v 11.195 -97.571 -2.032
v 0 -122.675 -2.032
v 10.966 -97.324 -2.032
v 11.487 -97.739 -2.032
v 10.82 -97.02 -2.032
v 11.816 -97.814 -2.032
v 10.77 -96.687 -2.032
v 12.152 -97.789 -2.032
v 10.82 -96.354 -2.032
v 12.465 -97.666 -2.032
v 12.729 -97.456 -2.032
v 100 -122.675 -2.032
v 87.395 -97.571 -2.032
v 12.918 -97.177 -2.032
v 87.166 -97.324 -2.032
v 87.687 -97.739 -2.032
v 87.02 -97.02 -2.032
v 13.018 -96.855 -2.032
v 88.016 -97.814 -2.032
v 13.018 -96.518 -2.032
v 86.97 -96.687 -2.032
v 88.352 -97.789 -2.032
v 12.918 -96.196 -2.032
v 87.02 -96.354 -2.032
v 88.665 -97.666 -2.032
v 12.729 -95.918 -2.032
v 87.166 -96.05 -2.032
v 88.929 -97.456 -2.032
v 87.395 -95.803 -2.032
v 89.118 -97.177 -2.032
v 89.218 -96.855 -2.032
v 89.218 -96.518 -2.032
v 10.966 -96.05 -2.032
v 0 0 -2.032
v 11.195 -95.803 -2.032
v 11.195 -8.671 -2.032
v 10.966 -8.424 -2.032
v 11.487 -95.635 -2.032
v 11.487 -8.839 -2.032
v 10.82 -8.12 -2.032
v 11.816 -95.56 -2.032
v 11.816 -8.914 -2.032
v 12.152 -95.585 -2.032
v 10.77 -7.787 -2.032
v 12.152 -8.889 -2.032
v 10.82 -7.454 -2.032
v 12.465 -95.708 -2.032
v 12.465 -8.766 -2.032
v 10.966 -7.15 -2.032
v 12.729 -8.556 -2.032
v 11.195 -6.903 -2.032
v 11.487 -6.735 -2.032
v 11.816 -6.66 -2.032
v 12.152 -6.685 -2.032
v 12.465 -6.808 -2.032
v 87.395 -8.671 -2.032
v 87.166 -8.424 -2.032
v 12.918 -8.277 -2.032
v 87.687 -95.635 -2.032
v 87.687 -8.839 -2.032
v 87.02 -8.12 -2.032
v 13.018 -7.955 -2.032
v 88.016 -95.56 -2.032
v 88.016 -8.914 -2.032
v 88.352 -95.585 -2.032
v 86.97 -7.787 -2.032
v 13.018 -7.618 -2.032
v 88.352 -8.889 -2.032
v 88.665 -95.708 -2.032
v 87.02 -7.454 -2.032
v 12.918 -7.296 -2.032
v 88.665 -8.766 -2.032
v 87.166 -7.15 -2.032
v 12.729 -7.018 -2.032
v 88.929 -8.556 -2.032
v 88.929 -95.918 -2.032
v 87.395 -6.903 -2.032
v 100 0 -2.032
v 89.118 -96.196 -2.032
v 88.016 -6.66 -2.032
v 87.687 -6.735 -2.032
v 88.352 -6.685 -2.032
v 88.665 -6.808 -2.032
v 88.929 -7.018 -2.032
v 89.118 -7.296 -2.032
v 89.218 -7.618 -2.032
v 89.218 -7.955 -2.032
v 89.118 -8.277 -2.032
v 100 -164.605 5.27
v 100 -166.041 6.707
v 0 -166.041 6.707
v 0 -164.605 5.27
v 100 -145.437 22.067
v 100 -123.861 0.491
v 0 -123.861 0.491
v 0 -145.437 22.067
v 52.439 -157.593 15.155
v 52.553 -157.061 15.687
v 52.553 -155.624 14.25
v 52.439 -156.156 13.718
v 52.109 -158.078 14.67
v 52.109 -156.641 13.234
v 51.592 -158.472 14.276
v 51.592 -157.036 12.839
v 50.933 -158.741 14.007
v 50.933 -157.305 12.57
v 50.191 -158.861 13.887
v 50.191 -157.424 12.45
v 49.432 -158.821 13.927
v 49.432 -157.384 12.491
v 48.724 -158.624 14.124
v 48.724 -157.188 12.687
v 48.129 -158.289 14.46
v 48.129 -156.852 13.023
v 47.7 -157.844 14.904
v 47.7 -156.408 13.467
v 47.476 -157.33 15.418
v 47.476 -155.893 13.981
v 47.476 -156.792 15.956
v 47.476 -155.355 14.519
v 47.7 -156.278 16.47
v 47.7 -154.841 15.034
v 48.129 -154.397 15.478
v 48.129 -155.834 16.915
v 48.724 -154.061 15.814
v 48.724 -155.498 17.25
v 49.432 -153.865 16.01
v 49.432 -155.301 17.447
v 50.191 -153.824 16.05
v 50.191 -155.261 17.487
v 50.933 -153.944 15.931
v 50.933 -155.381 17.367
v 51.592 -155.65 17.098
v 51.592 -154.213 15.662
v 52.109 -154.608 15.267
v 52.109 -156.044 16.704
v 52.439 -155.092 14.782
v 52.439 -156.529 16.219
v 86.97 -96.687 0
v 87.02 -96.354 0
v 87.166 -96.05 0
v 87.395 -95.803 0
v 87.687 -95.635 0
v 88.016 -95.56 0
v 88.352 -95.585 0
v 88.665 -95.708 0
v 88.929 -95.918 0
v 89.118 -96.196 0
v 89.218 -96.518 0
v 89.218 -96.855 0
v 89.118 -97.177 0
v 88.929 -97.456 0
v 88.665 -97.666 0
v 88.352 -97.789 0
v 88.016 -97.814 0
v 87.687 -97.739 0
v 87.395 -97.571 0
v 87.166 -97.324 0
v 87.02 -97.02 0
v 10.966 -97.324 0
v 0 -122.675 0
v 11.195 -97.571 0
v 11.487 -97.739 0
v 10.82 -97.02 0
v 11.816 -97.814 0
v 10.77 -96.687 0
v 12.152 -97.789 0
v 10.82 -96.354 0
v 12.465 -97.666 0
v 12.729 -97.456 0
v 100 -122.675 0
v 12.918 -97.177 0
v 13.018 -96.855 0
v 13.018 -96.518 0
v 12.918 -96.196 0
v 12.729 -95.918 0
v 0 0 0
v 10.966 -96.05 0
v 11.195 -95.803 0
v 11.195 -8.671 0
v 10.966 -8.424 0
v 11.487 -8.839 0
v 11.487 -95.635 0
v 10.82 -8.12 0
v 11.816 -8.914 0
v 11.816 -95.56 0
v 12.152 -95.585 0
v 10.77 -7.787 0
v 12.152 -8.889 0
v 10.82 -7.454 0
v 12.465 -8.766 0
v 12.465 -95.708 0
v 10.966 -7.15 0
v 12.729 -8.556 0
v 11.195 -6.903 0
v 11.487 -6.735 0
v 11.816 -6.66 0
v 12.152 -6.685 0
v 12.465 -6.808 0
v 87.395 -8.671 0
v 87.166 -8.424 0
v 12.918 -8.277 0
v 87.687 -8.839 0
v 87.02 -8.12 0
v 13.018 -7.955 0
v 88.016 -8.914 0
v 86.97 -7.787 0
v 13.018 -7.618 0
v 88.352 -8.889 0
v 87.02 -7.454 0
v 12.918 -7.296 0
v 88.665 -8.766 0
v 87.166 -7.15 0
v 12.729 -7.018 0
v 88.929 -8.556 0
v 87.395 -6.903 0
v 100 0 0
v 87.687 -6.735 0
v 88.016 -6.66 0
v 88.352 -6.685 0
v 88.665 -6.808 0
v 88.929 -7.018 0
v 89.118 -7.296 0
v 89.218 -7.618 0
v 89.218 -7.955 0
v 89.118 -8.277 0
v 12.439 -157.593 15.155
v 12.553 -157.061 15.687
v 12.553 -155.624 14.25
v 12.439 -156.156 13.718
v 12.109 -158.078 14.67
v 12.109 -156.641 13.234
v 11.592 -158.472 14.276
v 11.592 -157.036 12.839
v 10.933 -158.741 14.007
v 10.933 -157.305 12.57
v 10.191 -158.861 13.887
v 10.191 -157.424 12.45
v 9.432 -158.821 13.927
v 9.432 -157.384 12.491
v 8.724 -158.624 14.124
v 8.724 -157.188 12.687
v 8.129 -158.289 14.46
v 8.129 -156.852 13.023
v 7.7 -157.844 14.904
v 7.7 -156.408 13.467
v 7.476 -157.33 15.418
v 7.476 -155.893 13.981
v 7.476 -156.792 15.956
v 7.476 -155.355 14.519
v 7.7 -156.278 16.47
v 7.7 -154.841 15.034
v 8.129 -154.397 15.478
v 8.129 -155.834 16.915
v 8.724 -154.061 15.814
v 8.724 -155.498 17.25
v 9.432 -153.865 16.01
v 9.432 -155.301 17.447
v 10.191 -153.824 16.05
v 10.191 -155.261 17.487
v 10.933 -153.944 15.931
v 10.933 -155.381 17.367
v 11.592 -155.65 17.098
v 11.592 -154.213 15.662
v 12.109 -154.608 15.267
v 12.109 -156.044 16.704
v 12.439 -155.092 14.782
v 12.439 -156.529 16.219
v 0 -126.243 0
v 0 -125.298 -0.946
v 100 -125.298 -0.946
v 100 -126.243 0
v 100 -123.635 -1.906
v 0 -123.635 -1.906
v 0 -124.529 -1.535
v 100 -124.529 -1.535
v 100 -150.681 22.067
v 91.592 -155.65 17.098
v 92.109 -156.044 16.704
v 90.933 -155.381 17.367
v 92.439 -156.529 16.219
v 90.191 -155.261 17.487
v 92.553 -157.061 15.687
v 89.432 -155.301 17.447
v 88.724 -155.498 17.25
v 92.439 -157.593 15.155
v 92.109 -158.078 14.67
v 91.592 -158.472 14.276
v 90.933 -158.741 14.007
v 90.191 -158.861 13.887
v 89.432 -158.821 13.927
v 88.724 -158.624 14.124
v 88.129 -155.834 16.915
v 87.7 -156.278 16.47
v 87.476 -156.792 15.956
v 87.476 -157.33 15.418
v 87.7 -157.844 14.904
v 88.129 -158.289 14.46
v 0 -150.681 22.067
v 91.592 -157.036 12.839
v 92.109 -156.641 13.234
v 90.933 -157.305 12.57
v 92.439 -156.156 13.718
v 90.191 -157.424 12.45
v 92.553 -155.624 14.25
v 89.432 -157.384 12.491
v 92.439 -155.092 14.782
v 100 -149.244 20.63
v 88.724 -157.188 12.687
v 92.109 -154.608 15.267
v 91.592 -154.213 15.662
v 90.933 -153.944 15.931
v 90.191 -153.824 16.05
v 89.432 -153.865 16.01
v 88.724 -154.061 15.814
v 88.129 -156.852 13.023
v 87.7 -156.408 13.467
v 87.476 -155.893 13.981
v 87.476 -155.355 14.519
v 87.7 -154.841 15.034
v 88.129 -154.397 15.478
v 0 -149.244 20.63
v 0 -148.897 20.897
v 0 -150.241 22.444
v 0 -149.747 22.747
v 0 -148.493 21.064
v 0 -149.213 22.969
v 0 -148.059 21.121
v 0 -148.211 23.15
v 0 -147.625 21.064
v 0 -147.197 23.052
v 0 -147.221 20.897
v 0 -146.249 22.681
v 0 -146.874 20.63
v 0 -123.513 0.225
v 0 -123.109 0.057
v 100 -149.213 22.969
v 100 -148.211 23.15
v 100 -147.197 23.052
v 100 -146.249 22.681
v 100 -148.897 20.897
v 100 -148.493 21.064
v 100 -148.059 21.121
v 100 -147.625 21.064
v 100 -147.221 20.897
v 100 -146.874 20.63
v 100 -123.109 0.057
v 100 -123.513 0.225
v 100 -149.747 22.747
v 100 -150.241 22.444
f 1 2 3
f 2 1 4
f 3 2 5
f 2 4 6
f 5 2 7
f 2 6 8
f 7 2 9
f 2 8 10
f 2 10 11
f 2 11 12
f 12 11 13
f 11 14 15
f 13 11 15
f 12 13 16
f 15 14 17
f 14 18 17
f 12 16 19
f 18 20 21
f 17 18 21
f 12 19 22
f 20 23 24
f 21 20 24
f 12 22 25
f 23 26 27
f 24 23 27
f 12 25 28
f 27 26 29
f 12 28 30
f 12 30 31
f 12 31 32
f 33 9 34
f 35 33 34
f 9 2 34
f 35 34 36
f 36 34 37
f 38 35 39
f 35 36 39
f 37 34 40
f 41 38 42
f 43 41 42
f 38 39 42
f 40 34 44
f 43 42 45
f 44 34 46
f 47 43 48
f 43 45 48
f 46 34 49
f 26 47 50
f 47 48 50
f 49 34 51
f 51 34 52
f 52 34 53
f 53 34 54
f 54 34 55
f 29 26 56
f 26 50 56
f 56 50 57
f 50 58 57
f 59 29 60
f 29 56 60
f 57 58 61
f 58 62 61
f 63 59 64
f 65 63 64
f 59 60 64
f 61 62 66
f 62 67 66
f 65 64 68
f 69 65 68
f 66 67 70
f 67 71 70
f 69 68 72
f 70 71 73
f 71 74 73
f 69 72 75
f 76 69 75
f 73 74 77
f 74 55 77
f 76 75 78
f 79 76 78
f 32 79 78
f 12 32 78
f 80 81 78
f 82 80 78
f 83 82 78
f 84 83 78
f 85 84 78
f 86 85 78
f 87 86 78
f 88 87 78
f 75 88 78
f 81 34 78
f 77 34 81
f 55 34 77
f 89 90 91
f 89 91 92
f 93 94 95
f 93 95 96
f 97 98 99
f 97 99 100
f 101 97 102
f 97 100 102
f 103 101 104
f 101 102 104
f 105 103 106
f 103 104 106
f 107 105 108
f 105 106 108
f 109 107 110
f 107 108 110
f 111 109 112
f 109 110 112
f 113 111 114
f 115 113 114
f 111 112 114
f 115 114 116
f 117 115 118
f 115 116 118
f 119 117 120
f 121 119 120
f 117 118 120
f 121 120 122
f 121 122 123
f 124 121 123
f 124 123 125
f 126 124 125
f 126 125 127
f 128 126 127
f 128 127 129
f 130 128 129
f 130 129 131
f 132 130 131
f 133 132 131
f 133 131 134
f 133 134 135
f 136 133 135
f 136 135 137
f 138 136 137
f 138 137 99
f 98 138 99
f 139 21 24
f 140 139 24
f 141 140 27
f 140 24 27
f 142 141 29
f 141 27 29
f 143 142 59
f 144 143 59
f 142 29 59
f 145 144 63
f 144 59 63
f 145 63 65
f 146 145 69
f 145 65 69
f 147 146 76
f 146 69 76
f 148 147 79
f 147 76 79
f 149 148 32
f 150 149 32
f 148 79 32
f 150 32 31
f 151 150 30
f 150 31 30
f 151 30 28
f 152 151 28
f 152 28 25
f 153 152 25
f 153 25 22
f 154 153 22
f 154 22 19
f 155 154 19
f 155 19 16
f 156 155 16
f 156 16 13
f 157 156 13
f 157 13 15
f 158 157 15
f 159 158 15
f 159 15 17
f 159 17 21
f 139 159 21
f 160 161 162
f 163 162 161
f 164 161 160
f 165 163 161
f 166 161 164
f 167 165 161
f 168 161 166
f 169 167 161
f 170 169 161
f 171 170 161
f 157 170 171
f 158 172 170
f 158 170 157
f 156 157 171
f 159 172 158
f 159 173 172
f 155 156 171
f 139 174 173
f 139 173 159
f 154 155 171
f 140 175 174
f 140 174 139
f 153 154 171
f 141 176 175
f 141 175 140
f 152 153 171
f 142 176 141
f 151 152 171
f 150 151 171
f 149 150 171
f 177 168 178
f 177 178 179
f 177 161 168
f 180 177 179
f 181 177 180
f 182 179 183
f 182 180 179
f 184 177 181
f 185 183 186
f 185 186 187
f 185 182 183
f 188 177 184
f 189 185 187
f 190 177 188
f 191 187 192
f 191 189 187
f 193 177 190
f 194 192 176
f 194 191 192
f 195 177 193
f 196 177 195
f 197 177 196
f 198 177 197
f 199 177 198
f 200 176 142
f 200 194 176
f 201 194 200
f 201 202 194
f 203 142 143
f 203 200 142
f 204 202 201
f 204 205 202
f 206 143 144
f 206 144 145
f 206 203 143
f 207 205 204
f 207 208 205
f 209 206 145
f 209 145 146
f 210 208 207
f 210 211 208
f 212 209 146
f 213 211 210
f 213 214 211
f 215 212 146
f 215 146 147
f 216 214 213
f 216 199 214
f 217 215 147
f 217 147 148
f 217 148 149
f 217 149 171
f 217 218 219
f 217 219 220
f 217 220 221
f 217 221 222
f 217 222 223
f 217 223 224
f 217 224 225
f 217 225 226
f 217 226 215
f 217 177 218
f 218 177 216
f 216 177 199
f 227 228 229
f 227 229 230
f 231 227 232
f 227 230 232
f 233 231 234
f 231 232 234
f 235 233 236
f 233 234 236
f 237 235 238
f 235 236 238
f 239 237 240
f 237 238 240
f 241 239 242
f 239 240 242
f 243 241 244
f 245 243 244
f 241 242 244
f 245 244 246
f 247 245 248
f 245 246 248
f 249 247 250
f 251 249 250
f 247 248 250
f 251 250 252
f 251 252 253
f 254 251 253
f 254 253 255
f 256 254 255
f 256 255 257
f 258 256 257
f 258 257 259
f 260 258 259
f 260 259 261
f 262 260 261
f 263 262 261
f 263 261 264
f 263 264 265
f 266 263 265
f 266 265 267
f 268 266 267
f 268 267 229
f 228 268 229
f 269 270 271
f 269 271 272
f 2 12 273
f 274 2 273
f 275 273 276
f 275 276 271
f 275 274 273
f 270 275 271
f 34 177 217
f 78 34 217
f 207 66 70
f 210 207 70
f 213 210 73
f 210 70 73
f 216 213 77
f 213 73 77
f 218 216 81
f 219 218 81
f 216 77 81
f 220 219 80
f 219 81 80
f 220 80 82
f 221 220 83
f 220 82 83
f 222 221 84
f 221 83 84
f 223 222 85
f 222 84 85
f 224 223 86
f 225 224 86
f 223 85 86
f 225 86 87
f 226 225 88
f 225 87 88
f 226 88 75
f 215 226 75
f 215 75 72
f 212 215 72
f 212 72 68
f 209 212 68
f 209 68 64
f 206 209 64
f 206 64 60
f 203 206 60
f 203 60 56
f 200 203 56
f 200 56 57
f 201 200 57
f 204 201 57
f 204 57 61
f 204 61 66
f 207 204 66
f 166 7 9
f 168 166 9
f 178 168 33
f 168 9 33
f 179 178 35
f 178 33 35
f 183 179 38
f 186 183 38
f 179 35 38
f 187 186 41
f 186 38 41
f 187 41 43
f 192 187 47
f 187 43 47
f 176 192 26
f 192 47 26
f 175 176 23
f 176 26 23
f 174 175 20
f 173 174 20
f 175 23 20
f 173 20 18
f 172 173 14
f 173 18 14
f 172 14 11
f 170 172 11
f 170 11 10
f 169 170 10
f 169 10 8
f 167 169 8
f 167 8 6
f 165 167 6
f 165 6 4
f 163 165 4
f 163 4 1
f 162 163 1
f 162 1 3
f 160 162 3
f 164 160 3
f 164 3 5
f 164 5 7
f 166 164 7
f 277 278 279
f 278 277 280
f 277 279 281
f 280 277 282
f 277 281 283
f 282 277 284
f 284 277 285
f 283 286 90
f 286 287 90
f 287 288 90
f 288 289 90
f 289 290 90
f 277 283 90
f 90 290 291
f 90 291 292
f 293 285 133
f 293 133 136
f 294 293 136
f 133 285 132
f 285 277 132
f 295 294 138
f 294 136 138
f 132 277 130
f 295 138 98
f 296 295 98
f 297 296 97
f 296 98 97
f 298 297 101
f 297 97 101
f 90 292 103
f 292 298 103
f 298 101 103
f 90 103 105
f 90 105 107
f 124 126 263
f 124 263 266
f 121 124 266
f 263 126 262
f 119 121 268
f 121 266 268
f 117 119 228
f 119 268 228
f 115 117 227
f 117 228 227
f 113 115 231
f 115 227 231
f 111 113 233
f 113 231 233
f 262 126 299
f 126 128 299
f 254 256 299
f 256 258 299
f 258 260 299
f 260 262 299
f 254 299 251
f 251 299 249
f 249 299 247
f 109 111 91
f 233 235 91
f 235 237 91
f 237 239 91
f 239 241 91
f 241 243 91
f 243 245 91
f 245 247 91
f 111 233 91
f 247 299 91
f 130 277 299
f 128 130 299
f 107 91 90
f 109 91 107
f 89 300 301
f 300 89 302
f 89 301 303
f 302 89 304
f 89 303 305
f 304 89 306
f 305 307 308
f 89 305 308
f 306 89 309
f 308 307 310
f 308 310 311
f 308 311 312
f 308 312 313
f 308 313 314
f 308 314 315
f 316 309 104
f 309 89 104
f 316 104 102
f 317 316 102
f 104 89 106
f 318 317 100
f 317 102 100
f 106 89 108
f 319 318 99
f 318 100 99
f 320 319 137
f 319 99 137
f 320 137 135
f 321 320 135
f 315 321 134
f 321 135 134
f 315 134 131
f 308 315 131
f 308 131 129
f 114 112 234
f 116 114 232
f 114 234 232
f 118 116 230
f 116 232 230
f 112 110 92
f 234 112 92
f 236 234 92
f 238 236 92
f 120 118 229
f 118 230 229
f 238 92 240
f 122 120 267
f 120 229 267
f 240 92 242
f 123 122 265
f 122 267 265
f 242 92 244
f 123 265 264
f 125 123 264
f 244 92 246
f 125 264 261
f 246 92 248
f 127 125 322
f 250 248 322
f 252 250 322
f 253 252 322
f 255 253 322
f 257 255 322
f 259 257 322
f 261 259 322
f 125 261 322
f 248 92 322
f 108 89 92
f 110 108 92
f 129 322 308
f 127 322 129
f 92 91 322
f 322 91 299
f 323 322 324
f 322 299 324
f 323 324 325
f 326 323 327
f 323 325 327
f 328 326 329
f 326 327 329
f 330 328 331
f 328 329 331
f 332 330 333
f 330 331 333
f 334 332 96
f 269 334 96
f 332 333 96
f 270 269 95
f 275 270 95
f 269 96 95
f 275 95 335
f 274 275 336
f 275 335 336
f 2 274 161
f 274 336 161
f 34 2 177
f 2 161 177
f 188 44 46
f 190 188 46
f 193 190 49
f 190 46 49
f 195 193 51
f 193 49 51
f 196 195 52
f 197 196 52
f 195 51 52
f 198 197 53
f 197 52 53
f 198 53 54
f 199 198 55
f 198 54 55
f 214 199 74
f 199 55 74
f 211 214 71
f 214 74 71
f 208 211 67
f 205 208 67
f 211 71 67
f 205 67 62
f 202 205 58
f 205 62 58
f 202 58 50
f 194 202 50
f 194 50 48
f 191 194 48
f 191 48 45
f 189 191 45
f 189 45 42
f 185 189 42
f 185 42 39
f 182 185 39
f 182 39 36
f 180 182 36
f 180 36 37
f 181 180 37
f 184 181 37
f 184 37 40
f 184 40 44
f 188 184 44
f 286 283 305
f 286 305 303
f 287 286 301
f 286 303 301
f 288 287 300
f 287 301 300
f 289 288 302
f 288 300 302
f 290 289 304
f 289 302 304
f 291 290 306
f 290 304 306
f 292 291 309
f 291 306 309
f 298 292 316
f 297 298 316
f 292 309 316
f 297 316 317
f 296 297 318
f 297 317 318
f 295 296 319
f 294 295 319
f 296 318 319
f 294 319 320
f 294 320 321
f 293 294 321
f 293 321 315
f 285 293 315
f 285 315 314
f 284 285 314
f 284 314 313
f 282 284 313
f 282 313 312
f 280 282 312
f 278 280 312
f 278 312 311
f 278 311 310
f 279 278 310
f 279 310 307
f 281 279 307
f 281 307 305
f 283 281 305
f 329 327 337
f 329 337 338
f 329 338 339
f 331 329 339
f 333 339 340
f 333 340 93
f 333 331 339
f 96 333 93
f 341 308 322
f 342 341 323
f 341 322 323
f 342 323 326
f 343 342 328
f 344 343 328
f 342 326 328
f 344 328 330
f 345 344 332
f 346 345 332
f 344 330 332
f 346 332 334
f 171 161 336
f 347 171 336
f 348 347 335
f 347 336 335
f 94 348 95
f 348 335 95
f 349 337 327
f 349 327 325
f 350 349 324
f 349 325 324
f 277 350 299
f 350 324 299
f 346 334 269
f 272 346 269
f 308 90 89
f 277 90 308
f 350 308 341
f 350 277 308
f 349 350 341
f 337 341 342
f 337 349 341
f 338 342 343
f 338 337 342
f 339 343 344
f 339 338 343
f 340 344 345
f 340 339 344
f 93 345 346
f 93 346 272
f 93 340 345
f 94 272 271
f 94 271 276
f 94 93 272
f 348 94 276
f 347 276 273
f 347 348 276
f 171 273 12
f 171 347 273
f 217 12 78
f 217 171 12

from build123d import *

# Parameters (mm, degrees)
SKETCH1_W               = 100
SKETCH1_H               = 180.7762
BASE_FLANGE1_DEPTH      = 2.032
SKETCHED_BEND1_DEPTH    = 100
SKETCHED_BEND1_2_DEPTH  = 100
SKETCHED_BEND2_DEPTH    = 100
SKETCHED_BEND2_2_DEPTH  = 100
CUT_EXTRUDE1_DEPTH      = 196.207207632
CUT_EXTRUDE1_DEPTH_BACK = 196.207207632
SKETCH1_4_R             = 1.13
F_4_40_TAPPED_HOLE1_D   = 2.2606
SKETCH11_R              = 2.5
CUT_EXTRUDE2_DEPTH      = 2.032
F_1_4_20_TAPPED_HOLE3_D = 5.1054


# Read off the part's stored shape, not the designer's step: Sketched Bend1, Sketched Bend2
# Sheet-metal steps are written as plain solids
with BuildPart() as part:
    # Sketch1 → Base-Flange1 (new body)
    with BuildSketch(Plane.XY):
        with Locations((50, -90.3881)):
            Rectangle(SKETCH1_W, SKETCH1_H)
    extrude(amount=-BASE_FLANGE1_DEPTH)

    # Sketched Bend1 outline → Sketched Bend1 (cut)
    with BuildSketch(Plane.YZ):
        with BuildLine():
            Line((-125.297528233, -0.945834787), (-126.24336302, 0))
            Line((-126.24336302, 0), (-180.7762, 0))
            Line((-180.7762, 0), (-180.7762, -2.032))
            Line((-180.7762, -2.032), (-122.675293446, -2.032))
            ThreePointArc((-122.675293446, -2.032), (-124.094436686, -1.749714858), (-125.297528233, -0.945834787))
        make_face()
    extrude(amount=SKETCHED_BEND1_DEPTH, mode=Mode.SUBTRACT)

    # Sketched Bend1 2 outline → Sketched Bend1 2 (add)
    with BuildSketch(Plane.YZ):
        with BuildLine():
            Line((-163.561829245, 40.192148183), (-164.998670225, 38.755307204))
            Line((-164.998670225, 38.755307204), (-126.24336302, 0))
            Line((-126.24336302, 0), (-122.675293446, 0))
            ThreePointArc((-122.675293446, 0), (-123.316823952, 0.127608352), (-123.860687254, 0.491006192))
            Line((-123.860687254, 0.491006192), (-163.561829245, 40.192148183))
        make_face()
    extrude(amount=SKETCHED_BEND1_2_DEPTH)

    # Sketched Bend2 outline → Sketched Bend2 (cut)
    with BuildSketch(Plane.YZ):
        with BuildLine():
            Line((-164.998670225, 38.755307204), (-149.212692342, 22.969329321))
            ThreePointArc((-149.212692342, 22.969329321), (-147.197284992, 23.051802202), (-145.43684371, 22.067162648))
            Line((-145.43684371, 22.067162648), (-163.561829245, 40.192148183))
            Line((-163.561829245, 40.192148183), (-164.998670225, 38.755307204))
        make_face()
    extrude(amount=SKETCHED_BEND2_DEPTH, mode=Mode.SUBTRACT)

    # Sketched Bend2 2 outline → Sketched Bend2 2 (add)
    with BuildSketch(Plane.YZ):
        with BuildLine():
            Line((-164.604651788, 5.270142185), (-149.244472305, 20.630321668))
            ThreePointArc((-149.244472305, 20.630321668), (-148.059078497, 21.12132786), (-146.873684689, 20.630321668))
            Line((-146.873684689, 20.630321668), (-149.212692342, 22.969329321))
            ThreePointArc((-149.212692342, 22.969329321), (-150.000143771, 22.604753197), (-150.681313284, 22.067162648))
            Line((-150.681313284, 22.067162648), (-166.041492767, 6.706983165))
            Line((-166.041492767, 6.706983165), (-164.604651788, 5.270142185))
        make_face()
    extrude(amount=SKETCHED_BEND2_2_DEPTH)

    # Sketch1<4> → Cut-Extrude1 (cut, two sides: drawn at the far end of the back side and taken through both)
    with BuildSketch(Plane.XY.offset(-CUT_EXTRUDE1_DEPTH_BACK)):
        with Locations((11.9, -7.7868)):
            Circle(SKETCH1_4_R)
        with Locations((88.1, -7.7868)):
            Circle(SKETCH1_4_R)
        with Locations((88.1, -96.6868)):
            Circle(SKETCH1_4_R)
        with Locations((11.9, -96.6868)):
            Circle(SKETCH1_4_R)
    extrude(amount=CUT_EXTRUDE1_DEPTH + CUT_EXTRUDE1_DEPTH_BACK, mode=Mode.SUBTRACT)

    # #4-40 Tapped Hole1 (through all)
    with Locations(Plane(origin=(88.1, -96.6868, 0), x_dir=(1, 0, 0), z_dir=(0, 0, 1))):
        with Locations((0, 0), (-76.2, 0), (-76.2, 88.9), (0, 88.9)):
            Hole(F_4_40_TAPPED_HOLE1_D / 2)

    # Sketch11 → Cut-Extrude2 (cut)
    with BuildSketch(Plane(origin=(0, -86.374237966, 86.374237966), x_dir=(-1, 0, 0), z_dir=(0, -0.7071067811865487, 0.7071067811865465))):
        with Locations(Location((-10, 99.966512217, 0), (0, 0, 90))):
            Circle(SKETCH11_R)
        with Locations(Location((-50, 99.966512217, 0), (0, 0, 90))):
            Circle(SKETCH11_R)
        with Locations(Location((-90, 99.966512217, 0), (0, 0, 90))):
            Circle(SKETCH11_R)
    extrude(amount=-CUT_EXTRUDE2_DEPTH, mode=Mode.SUBTRACT)

    # 1/4-20 Tapped Hole3 (through all)
    with Locations(Plane(origin=(0, -86.374237966, 86.374237966), x_dir=(-1, 0, 0), z_dir=(0, -0.7071067811865487, 0.7071067811865465))):
        with Locations((-90, 99.966512217), (-50, 99.966512217), (-10, 99.966512217)):
            Hole(F_1_4_20_TAPPED_HOLE3_D / 2)


solid = part.part
